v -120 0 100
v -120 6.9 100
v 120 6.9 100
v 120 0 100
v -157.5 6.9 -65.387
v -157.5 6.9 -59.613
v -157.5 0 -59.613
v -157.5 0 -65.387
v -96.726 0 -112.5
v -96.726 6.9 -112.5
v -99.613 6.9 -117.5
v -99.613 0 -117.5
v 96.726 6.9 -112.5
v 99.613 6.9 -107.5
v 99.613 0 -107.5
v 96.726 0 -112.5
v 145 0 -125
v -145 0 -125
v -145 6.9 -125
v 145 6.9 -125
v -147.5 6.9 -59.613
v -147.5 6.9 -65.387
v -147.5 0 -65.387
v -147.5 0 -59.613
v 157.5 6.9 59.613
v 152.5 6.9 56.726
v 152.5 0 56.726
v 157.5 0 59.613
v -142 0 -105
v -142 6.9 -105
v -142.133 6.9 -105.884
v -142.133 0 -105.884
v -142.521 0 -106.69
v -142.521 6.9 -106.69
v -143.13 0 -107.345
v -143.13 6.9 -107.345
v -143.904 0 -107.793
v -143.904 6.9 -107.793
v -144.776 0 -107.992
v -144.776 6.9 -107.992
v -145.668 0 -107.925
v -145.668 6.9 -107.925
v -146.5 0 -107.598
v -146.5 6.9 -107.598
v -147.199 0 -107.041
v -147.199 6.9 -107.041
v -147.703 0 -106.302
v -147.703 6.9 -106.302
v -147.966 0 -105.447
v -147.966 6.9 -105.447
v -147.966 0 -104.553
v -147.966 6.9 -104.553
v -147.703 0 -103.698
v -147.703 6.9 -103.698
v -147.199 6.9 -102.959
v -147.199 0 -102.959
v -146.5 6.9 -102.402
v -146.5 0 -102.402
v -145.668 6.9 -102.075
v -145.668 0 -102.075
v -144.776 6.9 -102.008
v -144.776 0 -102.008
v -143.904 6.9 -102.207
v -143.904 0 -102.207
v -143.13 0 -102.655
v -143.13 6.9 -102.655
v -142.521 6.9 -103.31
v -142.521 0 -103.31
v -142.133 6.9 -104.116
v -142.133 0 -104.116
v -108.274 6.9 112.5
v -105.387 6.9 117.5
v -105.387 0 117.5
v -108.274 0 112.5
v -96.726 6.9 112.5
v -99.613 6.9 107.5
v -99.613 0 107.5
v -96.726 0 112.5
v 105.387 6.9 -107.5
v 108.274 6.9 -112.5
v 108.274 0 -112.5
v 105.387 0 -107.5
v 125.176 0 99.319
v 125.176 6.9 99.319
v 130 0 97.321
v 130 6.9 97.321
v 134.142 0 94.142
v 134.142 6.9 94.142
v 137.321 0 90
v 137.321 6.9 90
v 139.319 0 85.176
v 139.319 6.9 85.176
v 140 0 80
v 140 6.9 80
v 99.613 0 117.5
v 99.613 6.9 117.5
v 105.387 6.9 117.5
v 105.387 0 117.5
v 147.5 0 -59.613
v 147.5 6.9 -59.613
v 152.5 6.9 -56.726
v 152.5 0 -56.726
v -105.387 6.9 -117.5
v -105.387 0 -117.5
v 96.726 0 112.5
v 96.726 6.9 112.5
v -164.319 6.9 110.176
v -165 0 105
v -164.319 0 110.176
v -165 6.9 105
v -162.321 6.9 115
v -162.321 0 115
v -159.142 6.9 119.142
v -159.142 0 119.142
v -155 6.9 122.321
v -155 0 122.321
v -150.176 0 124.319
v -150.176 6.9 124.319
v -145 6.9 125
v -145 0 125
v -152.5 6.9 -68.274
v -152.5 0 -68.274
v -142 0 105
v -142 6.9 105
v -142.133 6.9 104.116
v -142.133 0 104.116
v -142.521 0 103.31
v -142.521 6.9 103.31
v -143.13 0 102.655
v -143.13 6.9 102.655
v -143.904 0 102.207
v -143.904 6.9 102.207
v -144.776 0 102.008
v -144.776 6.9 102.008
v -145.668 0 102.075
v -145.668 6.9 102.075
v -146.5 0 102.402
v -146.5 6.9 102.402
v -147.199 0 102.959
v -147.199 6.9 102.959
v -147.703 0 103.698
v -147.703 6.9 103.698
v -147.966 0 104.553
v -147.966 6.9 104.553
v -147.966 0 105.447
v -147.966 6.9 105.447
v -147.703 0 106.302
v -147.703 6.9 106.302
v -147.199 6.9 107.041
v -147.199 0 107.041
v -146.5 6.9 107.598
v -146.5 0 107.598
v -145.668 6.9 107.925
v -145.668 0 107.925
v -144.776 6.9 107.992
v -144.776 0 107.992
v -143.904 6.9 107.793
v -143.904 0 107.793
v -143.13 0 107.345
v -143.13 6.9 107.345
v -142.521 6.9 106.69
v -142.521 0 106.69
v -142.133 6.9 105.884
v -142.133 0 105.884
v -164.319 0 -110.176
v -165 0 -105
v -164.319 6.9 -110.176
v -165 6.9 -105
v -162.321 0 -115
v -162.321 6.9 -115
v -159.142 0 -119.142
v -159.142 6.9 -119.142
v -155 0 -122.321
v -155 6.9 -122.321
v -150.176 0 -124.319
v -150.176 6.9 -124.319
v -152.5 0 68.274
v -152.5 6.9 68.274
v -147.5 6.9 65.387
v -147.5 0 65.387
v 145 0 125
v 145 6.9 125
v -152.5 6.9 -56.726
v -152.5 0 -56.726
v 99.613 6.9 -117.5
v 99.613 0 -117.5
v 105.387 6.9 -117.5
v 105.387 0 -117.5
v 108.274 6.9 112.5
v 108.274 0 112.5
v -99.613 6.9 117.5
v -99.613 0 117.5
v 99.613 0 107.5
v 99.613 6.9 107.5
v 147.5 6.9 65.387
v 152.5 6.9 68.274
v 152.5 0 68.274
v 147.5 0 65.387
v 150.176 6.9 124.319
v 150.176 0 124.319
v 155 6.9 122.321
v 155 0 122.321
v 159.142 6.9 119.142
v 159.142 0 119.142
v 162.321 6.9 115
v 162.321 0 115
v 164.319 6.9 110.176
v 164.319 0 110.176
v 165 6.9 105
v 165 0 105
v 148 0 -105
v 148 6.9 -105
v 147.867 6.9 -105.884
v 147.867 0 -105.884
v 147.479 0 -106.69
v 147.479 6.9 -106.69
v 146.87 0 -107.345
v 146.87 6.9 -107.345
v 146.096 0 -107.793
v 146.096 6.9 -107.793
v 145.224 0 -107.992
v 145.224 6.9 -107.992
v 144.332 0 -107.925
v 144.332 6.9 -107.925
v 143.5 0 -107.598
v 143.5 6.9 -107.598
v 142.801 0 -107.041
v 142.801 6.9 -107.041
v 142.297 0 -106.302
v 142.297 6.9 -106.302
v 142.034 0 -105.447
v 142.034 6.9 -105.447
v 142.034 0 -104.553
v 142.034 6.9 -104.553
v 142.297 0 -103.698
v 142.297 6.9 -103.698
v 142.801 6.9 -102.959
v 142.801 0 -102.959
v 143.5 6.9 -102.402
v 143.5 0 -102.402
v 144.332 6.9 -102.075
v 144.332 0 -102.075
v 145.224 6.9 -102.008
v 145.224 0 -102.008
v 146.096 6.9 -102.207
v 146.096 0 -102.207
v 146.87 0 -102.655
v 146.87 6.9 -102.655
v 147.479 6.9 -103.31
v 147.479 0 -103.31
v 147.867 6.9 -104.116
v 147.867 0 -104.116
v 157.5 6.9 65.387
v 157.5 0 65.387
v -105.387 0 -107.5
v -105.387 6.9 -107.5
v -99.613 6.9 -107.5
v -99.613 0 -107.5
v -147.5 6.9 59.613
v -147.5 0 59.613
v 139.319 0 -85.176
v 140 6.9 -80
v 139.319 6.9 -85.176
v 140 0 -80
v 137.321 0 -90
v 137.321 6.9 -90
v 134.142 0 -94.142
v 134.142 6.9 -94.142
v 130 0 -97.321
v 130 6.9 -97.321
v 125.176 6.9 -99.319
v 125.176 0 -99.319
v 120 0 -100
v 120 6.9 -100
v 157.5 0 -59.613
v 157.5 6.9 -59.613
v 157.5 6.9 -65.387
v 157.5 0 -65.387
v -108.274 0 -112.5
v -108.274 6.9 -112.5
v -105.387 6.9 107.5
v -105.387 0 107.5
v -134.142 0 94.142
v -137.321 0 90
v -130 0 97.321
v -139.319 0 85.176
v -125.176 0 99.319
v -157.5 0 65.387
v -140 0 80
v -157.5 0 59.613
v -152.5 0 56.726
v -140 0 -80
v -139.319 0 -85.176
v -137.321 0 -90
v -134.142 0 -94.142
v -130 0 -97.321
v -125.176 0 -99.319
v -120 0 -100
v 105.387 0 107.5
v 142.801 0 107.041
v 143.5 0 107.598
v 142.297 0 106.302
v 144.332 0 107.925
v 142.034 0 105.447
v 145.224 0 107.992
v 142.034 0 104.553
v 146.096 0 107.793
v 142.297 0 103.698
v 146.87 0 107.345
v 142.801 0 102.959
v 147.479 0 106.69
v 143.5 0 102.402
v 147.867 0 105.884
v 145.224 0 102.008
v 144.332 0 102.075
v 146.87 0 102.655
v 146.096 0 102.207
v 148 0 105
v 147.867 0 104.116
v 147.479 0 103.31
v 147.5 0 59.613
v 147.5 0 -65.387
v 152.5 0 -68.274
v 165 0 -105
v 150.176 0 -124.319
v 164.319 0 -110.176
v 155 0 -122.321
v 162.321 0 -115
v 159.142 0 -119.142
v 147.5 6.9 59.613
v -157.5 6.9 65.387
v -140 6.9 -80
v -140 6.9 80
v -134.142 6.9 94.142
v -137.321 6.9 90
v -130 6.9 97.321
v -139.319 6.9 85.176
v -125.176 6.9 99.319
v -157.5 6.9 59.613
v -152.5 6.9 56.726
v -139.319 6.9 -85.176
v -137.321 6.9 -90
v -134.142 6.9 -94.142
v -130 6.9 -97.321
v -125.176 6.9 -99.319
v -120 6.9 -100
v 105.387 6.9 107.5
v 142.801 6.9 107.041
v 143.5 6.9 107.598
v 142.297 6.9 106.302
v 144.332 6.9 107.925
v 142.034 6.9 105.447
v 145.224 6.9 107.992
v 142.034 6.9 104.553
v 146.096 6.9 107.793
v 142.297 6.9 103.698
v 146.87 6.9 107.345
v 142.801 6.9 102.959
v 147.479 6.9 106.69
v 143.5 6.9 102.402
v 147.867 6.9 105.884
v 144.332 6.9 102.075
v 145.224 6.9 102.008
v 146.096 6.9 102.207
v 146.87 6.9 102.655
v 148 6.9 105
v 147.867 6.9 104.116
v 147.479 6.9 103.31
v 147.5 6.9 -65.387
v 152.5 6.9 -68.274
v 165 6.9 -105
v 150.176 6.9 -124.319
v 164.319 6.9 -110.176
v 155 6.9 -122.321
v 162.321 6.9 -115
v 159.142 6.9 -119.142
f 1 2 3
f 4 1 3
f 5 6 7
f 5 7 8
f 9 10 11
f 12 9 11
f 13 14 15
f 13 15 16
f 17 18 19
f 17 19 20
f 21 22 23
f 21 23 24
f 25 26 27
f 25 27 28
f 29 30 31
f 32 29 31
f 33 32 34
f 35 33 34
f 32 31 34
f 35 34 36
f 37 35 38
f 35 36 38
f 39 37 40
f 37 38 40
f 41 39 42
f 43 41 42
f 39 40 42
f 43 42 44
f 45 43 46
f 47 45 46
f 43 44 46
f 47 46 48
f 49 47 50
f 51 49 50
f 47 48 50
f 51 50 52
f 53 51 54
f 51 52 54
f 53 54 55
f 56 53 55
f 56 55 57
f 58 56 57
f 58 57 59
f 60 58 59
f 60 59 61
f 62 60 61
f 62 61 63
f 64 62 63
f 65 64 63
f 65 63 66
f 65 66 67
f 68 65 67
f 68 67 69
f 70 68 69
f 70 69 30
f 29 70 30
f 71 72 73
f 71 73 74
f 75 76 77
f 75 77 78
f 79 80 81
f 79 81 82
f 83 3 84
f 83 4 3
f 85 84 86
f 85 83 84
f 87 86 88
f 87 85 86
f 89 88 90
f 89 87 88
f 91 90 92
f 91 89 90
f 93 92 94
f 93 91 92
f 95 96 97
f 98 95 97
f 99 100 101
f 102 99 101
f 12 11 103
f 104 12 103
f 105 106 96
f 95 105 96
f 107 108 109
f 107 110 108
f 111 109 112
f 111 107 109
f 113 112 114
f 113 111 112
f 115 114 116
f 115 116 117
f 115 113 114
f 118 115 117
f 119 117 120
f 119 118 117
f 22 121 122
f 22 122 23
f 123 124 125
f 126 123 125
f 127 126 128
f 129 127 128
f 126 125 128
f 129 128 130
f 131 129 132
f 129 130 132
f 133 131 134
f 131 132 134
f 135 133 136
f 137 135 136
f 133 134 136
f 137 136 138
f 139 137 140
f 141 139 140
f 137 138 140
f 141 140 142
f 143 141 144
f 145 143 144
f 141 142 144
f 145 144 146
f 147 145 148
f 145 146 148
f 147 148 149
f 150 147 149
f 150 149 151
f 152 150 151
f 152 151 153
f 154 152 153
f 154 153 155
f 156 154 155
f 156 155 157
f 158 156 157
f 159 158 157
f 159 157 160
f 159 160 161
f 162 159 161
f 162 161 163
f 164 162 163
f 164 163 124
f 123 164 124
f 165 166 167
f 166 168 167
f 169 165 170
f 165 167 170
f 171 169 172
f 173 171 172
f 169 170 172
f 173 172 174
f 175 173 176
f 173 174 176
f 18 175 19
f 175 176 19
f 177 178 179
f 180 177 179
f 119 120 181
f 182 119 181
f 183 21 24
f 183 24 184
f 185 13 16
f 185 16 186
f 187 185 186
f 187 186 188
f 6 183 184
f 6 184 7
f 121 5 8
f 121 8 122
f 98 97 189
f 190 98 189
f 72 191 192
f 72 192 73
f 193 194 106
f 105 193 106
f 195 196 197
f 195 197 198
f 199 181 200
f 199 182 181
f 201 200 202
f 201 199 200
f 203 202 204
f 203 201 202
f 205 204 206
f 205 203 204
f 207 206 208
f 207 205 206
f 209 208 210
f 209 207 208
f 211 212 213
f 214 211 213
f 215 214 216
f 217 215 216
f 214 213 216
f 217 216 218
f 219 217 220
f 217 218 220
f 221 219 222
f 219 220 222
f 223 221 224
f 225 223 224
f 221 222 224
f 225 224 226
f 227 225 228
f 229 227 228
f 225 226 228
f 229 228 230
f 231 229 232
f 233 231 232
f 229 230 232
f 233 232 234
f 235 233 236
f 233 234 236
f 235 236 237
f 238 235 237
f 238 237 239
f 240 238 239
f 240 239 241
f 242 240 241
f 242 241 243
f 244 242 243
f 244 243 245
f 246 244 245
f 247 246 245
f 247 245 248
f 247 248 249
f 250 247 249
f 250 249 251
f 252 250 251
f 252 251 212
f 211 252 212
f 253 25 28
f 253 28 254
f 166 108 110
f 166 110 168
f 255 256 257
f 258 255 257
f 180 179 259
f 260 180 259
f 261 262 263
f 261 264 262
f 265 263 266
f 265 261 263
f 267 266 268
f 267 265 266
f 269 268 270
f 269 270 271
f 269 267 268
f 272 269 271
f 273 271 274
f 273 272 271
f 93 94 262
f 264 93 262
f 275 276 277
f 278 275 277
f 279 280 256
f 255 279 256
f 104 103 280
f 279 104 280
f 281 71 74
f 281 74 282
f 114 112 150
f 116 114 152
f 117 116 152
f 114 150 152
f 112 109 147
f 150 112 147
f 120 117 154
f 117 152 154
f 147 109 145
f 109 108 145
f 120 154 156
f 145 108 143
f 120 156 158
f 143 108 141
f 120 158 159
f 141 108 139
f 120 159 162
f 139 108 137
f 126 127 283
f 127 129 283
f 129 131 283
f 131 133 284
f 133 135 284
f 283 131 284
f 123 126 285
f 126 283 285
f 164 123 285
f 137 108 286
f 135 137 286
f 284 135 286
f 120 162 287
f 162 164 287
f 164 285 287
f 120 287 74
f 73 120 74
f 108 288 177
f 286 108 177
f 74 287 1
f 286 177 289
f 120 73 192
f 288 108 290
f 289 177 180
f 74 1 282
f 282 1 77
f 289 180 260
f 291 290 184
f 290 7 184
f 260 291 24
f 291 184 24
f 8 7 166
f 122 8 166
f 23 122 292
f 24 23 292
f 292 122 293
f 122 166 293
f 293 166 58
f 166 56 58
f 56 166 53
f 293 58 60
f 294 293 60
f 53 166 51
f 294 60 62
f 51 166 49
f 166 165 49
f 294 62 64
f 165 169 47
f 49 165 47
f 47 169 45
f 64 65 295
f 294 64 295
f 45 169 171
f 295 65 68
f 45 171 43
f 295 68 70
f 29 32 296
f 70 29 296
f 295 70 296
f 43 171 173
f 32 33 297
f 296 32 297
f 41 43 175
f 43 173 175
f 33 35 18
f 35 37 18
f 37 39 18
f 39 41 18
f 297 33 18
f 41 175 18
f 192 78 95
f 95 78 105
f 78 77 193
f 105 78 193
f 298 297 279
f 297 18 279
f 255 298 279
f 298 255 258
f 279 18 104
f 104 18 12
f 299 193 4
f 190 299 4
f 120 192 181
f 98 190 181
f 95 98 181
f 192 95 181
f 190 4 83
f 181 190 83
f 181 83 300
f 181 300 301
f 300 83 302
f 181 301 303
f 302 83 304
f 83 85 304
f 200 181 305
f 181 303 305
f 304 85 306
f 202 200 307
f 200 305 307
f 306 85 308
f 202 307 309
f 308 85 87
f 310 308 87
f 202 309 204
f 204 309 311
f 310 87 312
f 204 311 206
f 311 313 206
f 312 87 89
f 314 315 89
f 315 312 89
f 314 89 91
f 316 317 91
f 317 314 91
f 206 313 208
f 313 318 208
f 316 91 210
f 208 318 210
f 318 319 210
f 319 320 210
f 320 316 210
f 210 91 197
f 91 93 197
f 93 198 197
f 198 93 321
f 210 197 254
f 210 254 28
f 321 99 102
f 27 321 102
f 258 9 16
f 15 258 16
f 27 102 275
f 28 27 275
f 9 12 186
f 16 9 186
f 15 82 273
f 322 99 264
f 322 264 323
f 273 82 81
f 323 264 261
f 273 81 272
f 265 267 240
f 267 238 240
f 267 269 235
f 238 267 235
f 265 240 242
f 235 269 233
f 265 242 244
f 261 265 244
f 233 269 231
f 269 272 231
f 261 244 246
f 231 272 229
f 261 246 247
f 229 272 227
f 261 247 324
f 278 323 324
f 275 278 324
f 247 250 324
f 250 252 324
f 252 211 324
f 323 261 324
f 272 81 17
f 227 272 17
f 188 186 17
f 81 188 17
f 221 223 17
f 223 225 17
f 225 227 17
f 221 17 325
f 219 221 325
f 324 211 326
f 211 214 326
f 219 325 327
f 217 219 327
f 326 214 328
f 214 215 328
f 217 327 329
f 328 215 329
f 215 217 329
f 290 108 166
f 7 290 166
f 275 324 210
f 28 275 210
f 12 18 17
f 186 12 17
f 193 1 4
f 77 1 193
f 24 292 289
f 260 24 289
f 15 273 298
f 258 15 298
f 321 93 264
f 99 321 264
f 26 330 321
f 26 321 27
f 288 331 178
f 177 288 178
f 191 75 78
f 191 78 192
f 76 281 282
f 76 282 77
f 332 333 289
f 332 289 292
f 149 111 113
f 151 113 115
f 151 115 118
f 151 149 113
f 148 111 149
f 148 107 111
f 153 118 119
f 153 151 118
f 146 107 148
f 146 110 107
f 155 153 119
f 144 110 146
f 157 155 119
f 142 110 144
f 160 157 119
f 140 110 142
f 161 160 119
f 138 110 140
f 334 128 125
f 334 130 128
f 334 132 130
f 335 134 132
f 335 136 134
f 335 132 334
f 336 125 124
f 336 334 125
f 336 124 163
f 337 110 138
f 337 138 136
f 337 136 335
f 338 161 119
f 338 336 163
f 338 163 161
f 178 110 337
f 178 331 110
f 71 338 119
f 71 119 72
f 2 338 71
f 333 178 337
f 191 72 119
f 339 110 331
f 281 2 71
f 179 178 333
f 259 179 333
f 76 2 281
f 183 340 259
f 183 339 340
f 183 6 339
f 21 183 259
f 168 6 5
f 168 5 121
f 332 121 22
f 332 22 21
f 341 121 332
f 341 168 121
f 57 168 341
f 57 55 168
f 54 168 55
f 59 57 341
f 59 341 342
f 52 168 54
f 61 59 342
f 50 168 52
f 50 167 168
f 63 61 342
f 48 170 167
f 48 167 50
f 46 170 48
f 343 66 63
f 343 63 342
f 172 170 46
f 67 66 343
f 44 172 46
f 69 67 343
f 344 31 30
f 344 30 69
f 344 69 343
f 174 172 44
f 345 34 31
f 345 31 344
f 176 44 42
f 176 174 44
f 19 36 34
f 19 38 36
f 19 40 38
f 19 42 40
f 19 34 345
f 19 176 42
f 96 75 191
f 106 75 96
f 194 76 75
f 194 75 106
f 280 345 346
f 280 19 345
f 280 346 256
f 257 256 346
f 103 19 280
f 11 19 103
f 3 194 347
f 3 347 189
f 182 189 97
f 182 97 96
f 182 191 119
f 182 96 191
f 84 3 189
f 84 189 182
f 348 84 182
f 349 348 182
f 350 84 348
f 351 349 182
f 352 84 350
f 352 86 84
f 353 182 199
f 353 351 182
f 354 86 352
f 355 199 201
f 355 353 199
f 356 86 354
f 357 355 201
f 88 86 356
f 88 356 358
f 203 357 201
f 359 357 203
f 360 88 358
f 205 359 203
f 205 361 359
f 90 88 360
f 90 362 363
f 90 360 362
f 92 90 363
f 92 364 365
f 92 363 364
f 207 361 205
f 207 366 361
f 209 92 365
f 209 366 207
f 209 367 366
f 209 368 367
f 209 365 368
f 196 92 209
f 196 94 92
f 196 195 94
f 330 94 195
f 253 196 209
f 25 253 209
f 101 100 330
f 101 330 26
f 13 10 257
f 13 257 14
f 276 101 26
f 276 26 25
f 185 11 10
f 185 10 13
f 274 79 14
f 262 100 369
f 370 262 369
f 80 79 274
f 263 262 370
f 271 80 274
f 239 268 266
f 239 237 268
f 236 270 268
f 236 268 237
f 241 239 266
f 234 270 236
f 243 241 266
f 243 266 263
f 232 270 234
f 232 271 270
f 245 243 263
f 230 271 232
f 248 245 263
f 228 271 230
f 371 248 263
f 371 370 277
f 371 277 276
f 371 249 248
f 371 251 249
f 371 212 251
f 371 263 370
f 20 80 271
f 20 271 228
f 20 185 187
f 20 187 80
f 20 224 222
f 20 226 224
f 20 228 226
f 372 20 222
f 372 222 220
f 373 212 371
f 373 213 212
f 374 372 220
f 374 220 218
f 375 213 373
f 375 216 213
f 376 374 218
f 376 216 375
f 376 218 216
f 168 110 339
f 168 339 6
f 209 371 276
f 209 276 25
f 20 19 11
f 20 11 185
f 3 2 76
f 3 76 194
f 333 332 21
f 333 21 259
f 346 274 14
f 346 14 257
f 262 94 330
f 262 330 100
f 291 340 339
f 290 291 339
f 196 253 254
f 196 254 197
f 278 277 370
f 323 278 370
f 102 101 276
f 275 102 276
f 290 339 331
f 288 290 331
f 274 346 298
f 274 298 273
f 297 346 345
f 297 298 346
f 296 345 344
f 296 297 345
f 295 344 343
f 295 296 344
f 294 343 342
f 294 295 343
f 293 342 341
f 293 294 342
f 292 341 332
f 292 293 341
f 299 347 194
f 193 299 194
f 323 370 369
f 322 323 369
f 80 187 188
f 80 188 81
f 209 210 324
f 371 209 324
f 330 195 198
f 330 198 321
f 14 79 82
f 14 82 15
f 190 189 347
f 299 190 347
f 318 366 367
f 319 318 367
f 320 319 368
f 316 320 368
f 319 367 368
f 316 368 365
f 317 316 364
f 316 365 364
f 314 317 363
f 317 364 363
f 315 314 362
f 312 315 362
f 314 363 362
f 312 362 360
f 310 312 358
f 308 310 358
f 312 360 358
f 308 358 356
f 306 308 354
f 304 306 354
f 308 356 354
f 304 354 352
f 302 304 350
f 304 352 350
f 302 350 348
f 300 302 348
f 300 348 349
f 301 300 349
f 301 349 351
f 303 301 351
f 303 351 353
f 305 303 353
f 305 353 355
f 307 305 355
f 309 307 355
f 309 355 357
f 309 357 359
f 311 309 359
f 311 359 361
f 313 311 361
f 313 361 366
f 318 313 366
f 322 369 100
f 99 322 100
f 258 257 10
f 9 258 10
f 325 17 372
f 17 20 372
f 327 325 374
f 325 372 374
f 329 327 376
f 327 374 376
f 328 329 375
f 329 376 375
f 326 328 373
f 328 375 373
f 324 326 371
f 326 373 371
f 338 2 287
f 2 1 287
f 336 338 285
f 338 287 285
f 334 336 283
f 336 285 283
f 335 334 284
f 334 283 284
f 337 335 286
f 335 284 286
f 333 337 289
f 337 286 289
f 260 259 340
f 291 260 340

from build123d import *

# Parameters (mm, degrees)
SKETCH1_W           = 330
SKETCH1_H           = 250
BOSS_EXTRUDE1_DEPTH = 6.9
SKETCH2_R           = 3
CUT_EXTRUDE1_DEPTH  = 7.9
SKETCH3_W           = 280
SKETCH3_H           = 200
CUT_EXTRUDE2_DEPTH  = 7.9
FILLET1_R           = 20
FILLET2_R           = 20
CUT_EXTRUDE4_DEPTH  = 7.9


with BuildPart() as part:
    # Sketch1 → Boss-Extrude1 (new body)
    with BuildSketch(Plane(origin=(0, 0, 0), x_dir=(1, 0, 0), z_dir=(0, 1, 0))):
        Rectangle(SKETCH1_W, SKETCH1_H)
    extrude(amount=BOSS_EXTRUDE1_DEPTH)

    # Sketch2 → Cut-Extrude1 (cut, through all)
    with BuildSketch(Plane(origin=(0, 6.9, 0), x_dir=(1, 0, 0), z_dir=(0, 1, 0))):
        with Locations((-145, 105)):
            Circle(SKETCH2_R)
        with Locations((145, 105)):
            Circle(SKETCH2_R)
        with Locations((145, -105)):
            Circle(SKETCH2_R)
        with Locations((-145, -105)):
            Circle(SKETCH2_R)
    extrude(amount=-CUT_EXTRUDE1_DEPTH, mode=Mode.SUBTRACT)

    # Sketch3 → Cut-Extrude2 (cut, through all)
    with BuildSketch(Plane(origin=(0, 6.9, 0), x_dir=(1, 0, 0), z_dir=(0, 1, 0))):
        Rectangle(SKETCH3_W, SKETCH3_H)
    extrude(amount=-CUT_EXTRUDE2_DEPTH, mode=Mode.SUBTRACT)

    # Fillet1
    fillet1_edges = [part.edges().sort_by_distance(p)[0] for p in [
        (-165, 3.45, -125),
        (165, 3.45, -125),
        (165, 3.45, 125),
        (-165, 3.45, 125),
    ]]
    fillet(fillet1_edges, radius=FILLET1_R)

    # Fillet2
    fillet2_edges = [part.edges().sort_by_distance(p)[0] for p in [
        (-140, 3.45, 100),
        (-140, 3.45, -100),
        (140, 3.45, -100),
        (140, 3.45, 100),
    ]]
    fillet(fillet2_edges, radius=FILLET2_R)

    # Sketch4 → Cut-Extrude4 (cut, through all)
    with BuildSketch(Plane(origin=(0, 6.9, 0), x_dir=(1, 0, 0), z_dir=(0, 1, 0))):
        Polygon((-105.386751346, -107.5), (-99.613248654, -107.5), (-96.726497308, -112.5), (-99.613248654, -117.5), (-105.386751346, -117.5), (-108.273502692, -112.5), align=None)
        Polygon((-147.5, -59.613248654), (-152.5, -56.726497308), (-157.5, -59.613248654), (-157.5, -65.386751346), (-152.5, -68.273502692), (-147.5, -65.386751346), align=None)
        Polygon((99.613248654, -107.5), (96.726497308, -112.5), (99.613248654, -117.5), (105.386751346, -117.5), (108.273502692, -112.5), (105.386751346, -107.5), align=None)
        Polygon((147.5, -65.386751346), (147.5, -59.613248654), (152.5, -56.726497308), (157.5, -59.613248654), (157.5, -65.386751346), (152.5, -68.273502692), align=None)
        Polygon((147.5, 59.613248654), (152.5, 56.726497308), (157.5, 59.613248654), (157.5, 65.386751346), (152.5, 68.273502692), (147.5, 65.386751346), align=None)
        Polygon((105.386751346, 107.5), (99.613248654, 107.5), (96.726497308, 112.5), (99.613248654, 117.5), (105.386751346, 117.5), (108.273502692, 112.5), align=None)
        Polygon((-99.613248654, 107.5), (-96.726497308, 112.5), (-99.613248654, 117.5), (-105.386751346, 117.5), (-108.273502692, 112.5), (-105.386751346, 107.5), align=None)
        Polygon((-147.5, 65.386751346), (-147.5, 59.613248654), (-152.5, 56.726497308), (-157.5, 59.613248654), (-157.5, 65.386751346), (-152.5, 68.273502692), align=None)
    extrude(amount=-CUT_EXTRUDE4_DEPTH, mode=Mode.SUBTRACT)


solid = part.part
